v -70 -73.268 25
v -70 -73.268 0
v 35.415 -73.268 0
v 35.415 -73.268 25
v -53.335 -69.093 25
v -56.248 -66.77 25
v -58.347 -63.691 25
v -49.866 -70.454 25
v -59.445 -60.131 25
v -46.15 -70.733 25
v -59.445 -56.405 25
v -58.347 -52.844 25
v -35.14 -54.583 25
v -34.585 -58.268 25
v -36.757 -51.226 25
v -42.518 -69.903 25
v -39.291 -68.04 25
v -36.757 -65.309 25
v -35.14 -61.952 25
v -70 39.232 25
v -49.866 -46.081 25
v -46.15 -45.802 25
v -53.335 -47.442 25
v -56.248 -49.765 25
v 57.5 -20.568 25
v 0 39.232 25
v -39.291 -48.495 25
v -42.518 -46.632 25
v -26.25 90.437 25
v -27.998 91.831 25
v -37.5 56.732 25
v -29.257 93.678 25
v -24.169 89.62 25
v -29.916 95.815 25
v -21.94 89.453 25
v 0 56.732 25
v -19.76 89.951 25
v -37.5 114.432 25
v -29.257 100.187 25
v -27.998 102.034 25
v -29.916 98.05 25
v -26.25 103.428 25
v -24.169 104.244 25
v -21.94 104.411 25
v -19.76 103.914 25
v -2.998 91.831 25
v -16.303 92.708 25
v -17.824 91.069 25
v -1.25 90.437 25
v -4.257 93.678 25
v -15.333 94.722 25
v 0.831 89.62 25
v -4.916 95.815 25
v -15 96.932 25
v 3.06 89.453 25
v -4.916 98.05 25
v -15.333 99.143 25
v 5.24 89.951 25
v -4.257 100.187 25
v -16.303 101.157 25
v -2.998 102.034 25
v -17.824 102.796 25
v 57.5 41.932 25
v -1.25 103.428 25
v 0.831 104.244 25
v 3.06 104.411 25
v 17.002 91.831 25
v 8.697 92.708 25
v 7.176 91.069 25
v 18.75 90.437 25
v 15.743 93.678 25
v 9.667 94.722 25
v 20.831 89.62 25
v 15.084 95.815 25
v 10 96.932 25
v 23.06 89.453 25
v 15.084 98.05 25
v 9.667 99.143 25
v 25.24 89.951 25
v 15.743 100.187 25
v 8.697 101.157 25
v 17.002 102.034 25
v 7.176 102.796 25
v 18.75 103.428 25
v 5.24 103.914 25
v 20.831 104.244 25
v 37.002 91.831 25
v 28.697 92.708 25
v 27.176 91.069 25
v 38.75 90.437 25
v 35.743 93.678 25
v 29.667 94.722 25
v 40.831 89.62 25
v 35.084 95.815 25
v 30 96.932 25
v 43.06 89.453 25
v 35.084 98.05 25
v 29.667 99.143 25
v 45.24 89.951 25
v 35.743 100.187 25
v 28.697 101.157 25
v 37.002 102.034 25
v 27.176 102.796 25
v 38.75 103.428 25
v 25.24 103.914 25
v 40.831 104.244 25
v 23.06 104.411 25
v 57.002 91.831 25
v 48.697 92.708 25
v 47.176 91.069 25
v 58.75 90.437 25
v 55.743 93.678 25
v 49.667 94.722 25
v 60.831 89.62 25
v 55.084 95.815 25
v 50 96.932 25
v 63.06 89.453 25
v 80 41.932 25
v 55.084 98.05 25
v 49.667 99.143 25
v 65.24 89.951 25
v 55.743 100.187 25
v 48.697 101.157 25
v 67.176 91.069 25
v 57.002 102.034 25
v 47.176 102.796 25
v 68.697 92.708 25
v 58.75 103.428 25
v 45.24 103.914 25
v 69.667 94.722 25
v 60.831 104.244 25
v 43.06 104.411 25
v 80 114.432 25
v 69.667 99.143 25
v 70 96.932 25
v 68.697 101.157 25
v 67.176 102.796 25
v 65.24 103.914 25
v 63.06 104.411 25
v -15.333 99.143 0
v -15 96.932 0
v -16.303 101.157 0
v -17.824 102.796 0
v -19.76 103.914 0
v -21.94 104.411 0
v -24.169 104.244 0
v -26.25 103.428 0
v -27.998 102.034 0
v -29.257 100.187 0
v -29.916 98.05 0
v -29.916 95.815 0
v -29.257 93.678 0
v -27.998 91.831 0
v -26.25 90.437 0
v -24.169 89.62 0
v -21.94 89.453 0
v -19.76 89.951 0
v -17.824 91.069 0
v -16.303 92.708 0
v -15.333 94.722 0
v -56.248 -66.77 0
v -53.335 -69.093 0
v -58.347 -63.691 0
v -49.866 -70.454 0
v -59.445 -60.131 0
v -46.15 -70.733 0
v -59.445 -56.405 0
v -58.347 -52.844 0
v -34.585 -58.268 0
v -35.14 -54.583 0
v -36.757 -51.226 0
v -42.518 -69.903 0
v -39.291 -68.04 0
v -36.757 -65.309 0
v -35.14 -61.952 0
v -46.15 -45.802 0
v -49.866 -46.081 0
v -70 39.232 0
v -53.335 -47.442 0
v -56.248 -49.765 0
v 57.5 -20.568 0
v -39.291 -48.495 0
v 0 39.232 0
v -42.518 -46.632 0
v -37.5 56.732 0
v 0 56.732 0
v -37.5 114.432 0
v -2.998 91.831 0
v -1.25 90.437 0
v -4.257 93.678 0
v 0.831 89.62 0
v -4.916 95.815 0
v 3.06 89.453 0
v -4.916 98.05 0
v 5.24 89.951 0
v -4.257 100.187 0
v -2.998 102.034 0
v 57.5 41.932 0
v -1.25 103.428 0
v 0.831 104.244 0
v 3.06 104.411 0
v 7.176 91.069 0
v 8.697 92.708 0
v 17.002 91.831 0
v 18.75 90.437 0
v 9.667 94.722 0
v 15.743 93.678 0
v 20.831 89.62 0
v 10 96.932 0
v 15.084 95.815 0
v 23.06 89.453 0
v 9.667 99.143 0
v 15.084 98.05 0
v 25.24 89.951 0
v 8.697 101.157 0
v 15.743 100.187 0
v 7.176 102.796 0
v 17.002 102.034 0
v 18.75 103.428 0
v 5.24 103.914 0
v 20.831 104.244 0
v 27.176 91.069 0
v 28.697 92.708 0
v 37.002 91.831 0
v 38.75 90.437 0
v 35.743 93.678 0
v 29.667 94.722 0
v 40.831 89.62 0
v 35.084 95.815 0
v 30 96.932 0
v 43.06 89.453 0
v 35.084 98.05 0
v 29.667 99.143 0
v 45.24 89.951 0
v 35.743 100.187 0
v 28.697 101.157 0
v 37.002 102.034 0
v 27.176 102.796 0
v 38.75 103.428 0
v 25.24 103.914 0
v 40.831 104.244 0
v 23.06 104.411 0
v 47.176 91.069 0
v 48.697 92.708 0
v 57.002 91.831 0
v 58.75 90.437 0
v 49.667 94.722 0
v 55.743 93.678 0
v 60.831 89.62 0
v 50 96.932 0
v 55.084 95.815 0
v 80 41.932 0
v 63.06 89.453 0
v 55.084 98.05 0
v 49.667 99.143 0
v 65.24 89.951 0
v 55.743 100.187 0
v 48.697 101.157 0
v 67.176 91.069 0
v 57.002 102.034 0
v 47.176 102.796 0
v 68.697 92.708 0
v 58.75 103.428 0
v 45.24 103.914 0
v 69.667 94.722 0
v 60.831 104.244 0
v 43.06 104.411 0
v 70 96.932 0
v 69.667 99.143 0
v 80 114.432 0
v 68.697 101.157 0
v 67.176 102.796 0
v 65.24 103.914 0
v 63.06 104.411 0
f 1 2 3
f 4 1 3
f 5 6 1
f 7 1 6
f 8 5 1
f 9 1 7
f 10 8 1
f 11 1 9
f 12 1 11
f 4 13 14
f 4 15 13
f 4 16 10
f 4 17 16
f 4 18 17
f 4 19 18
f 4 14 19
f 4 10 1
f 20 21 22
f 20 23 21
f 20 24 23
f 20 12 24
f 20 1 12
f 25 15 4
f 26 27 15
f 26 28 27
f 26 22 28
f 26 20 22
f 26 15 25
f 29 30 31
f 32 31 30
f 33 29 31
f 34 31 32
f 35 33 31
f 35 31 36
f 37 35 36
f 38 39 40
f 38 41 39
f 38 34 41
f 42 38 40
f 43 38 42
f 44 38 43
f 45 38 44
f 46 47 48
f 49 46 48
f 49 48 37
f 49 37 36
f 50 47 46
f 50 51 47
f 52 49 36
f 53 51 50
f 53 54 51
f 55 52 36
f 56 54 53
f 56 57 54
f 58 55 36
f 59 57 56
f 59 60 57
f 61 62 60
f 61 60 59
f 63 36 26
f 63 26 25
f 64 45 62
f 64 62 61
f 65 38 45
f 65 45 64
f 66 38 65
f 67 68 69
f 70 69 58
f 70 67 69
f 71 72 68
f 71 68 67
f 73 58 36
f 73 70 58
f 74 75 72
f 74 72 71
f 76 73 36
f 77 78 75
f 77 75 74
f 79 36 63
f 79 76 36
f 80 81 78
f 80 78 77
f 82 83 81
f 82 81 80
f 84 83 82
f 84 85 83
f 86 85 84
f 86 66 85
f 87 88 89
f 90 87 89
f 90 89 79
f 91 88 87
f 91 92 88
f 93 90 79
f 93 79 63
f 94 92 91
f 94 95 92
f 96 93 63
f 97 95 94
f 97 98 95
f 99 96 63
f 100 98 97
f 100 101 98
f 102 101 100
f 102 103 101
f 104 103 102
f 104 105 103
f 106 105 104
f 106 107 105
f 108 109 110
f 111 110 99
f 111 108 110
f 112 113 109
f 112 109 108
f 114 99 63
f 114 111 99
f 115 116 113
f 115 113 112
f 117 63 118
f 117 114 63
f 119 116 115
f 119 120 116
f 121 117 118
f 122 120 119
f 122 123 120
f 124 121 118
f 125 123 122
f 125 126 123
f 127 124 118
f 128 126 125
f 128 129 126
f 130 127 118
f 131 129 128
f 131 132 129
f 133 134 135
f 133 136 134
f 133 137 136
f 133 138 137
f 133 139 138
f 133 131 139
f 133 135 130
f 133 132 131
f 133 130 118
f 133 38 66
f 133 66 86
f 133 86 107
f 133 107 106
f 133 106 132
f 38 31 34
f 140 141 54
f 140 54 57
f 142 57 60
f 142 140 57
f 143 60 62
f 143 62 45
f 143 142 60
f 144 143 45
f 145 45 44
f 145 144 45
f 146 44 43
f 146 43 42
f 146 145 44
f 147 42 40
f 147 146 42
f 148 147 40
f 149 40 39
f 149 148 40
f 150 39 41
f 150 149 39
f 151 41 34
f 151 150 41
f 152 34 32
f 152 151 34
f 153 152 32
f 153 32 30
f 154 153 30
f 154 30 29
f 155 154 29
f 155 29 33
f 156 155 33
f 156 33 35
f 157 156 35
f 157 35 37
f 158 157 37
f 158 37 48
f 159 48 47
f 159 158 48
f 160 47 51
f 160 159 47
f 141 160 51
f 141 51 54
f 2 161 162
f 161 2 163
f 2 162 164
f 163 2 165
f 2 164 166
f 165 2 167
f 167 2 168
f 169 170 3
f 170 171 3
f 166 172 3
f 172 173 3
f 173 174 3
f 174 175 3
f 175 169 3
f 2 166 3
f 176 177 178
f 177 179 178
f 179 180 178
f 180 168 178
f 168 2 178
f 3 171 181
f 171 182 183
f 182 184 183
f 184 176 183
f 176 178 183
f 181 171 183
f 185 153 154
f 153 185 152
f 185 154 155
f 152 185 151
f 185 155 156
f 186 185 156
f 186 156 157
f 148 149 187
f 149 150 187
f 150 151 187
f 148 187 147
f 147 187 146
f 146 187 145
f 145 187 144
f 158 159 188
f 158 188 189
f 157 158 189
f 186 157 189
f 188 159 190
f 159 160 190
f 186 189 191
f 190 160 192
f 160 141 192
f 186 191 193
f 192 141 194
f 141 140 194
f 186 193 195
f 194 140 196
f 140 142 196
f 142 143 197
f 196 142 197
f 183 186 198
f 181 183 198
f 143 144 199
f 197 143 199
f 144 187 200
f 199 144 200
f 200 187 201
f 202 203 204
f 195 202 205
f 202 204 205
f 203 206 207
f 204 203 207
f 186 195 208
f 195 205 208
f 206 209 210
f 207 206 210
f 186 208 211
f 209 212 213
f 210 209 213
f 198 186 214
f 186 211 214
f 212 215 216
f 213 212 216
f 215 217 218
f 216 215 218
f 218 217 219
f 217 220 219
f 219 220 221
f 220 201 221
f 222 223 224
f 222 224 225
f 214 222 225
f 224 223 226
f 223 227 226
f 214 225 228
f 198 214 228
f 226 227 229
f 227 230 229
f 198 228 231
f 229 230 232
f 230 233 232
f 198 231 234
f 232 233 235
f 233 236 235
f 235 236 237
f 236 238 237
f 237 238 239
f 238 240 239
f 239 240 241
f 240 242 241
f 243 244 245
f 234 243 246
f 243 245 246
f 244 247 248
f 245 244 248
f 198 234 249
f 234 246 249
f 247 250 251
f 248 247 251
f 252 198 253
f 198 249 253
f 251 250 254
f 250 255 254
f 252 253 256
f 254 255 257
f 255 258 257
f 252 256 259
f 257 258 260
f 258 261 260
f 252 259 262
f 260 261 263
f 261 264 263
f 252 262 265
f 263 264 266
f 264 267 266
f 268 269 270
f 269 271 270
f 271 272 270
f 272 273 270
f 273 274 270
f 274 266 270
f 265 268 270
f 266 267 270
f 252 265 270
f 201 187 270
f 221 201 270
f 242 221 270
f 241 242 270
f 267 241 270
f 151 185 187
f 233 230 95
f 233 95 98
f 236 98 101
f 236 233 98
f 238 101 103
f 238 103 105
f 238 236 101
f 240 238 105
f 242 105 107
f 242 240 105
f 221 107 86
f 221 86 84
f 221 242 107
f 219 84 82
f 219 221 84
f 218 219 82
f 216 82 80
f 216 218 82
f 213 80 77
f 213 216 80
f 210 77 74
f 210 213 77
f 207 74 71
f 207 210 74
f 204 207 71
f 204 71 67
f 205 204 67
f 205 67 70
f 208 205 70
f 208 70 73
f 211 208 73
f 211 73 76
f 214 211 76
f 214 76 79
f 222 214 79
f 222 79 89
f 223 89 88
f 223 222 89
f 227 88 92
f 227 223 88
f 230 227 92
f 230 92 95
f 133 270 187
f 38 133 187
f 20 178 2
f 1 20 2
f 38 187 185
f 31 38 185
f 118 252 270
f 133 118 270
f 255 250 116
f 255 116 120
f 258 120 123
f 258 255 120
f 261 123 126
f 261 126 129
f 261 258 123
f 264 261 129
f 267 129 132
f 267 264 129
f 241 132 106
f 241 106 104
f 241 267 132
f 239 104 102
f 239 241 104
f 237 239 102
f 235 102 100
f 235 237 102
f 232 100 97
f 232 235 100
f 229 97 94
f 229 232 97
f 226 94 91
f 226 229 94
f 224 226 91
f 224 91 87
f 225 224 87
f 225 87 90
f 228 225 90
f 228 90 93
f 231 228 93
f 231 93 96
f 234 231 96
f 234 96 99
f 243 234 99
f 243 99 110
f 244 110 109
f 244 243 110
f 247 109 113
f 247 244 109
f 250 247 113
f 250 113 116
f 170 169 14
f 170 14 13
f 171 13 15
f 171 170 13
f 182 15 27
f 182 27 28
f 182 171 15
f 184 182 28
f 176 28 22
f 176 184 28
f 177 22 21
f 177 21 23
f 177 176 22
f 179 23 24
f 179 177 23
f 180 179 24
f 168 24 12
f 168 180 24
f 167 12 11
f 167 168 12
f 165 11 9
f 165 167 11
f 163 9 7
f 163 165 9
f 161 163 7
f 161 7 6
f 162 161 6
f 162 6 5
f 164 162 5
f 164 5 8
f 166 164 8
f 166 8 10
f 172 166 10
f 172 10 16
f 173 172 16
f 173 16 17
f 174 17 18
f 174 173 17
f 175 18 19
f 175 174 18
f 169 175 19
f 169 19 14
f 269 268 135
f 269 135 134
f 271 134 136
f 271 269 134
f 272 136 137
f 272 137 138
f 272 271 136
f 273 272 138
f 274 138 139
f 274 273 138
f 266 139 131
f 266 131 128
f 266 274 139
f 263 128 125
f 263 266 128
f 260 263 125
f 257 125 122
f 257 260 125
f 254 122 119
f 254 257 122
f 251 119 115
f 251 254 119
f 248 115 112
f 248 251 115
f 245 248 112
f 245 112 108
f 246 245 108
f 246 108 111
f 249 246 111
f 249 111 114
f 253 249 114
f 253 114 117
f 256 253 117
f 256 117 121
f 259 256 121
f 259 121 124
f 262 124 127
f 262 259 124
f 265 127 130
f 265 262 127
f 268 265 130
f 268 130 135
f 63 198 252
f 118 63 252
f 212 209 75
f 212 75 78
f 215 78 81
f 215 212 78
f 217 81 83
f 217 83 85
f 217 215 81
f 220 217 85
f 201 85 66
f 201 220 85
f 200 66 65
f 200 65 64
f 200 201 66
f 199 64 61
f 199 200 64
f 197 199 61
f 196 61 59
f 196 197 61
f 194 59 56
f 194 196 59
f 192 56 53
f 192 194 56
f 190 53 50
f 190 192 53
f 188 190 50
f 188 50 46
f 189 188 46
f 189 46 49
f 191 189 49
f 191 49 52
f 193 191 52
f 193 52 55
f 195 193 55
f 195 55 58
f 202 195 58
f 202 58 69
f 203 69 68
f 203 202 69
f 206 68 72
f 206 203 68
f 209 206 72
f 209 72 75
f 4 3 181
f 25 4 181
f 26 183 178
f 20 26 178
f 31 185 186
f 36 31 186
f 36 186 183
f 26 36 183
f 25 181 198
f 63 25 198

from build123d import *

# Parameters (mm, degrees)
F0_R     = 12.5
F0_R_2   = 7.5
F1_DEPTH = 25


with BuildPart() as f1:
    # F0 (on Top) → F1 (new body)
    with BuildSketch(Plane.XY):
        Polygon((80, 114.432458), (-37.5, 114.432458), (-37.5, 56.732458), (0, 56.732458), (0, 39.232458), (-70, 39.232458), (-70, -73.267542), (-50, -73.267542), (-25, -73.267542), (0, -73.267542), (35.415397, -73.267542), (57.5, -20.567542), (57.5, 41.932458), (80, 41.932458), (80, 96.932458), align=None)
        with Locations((-47.084603, -58.267542)):
            Circle(F0_R, mode=Mode.SUBTRACT)
        with Locations((-22.084603, -33.267542)):
            Circle(F0_R, mode=Mode.SUBTRACT)
        with Locations((0, -8.267542)):
            Circle(F0_R, mode=Mode.SUBTRACT)
        with Locations((-22.5, 96.932458)):
            Circle(F0_R_2, mode=Mode.SUBTRACT)
        with Locations((2.5, 96.932458)):
            Circle(F0_R_2, mode=Mode.SUBTRACT)
        with Locations((22.5, 96.932458)):
            Circle(F0_R_2, mode=Mode.SUBTRACT)
        with Locations((42.5, 96.932458)):
            Circle(F0_R_2, mode=Mode.SUBTRACT)
        with Locations((62.5, 96.932458)):
            Circle(F0_R_2, mode=Mode.SUBTRACT)
        with Locations((0, -8.267542)):
            Circle(F0_R)
        with Locations((-22.084603, -33.267542)):
            Circle(F0_R)
    extrude(amount=F1_DEPTH)


solid = f1.part
